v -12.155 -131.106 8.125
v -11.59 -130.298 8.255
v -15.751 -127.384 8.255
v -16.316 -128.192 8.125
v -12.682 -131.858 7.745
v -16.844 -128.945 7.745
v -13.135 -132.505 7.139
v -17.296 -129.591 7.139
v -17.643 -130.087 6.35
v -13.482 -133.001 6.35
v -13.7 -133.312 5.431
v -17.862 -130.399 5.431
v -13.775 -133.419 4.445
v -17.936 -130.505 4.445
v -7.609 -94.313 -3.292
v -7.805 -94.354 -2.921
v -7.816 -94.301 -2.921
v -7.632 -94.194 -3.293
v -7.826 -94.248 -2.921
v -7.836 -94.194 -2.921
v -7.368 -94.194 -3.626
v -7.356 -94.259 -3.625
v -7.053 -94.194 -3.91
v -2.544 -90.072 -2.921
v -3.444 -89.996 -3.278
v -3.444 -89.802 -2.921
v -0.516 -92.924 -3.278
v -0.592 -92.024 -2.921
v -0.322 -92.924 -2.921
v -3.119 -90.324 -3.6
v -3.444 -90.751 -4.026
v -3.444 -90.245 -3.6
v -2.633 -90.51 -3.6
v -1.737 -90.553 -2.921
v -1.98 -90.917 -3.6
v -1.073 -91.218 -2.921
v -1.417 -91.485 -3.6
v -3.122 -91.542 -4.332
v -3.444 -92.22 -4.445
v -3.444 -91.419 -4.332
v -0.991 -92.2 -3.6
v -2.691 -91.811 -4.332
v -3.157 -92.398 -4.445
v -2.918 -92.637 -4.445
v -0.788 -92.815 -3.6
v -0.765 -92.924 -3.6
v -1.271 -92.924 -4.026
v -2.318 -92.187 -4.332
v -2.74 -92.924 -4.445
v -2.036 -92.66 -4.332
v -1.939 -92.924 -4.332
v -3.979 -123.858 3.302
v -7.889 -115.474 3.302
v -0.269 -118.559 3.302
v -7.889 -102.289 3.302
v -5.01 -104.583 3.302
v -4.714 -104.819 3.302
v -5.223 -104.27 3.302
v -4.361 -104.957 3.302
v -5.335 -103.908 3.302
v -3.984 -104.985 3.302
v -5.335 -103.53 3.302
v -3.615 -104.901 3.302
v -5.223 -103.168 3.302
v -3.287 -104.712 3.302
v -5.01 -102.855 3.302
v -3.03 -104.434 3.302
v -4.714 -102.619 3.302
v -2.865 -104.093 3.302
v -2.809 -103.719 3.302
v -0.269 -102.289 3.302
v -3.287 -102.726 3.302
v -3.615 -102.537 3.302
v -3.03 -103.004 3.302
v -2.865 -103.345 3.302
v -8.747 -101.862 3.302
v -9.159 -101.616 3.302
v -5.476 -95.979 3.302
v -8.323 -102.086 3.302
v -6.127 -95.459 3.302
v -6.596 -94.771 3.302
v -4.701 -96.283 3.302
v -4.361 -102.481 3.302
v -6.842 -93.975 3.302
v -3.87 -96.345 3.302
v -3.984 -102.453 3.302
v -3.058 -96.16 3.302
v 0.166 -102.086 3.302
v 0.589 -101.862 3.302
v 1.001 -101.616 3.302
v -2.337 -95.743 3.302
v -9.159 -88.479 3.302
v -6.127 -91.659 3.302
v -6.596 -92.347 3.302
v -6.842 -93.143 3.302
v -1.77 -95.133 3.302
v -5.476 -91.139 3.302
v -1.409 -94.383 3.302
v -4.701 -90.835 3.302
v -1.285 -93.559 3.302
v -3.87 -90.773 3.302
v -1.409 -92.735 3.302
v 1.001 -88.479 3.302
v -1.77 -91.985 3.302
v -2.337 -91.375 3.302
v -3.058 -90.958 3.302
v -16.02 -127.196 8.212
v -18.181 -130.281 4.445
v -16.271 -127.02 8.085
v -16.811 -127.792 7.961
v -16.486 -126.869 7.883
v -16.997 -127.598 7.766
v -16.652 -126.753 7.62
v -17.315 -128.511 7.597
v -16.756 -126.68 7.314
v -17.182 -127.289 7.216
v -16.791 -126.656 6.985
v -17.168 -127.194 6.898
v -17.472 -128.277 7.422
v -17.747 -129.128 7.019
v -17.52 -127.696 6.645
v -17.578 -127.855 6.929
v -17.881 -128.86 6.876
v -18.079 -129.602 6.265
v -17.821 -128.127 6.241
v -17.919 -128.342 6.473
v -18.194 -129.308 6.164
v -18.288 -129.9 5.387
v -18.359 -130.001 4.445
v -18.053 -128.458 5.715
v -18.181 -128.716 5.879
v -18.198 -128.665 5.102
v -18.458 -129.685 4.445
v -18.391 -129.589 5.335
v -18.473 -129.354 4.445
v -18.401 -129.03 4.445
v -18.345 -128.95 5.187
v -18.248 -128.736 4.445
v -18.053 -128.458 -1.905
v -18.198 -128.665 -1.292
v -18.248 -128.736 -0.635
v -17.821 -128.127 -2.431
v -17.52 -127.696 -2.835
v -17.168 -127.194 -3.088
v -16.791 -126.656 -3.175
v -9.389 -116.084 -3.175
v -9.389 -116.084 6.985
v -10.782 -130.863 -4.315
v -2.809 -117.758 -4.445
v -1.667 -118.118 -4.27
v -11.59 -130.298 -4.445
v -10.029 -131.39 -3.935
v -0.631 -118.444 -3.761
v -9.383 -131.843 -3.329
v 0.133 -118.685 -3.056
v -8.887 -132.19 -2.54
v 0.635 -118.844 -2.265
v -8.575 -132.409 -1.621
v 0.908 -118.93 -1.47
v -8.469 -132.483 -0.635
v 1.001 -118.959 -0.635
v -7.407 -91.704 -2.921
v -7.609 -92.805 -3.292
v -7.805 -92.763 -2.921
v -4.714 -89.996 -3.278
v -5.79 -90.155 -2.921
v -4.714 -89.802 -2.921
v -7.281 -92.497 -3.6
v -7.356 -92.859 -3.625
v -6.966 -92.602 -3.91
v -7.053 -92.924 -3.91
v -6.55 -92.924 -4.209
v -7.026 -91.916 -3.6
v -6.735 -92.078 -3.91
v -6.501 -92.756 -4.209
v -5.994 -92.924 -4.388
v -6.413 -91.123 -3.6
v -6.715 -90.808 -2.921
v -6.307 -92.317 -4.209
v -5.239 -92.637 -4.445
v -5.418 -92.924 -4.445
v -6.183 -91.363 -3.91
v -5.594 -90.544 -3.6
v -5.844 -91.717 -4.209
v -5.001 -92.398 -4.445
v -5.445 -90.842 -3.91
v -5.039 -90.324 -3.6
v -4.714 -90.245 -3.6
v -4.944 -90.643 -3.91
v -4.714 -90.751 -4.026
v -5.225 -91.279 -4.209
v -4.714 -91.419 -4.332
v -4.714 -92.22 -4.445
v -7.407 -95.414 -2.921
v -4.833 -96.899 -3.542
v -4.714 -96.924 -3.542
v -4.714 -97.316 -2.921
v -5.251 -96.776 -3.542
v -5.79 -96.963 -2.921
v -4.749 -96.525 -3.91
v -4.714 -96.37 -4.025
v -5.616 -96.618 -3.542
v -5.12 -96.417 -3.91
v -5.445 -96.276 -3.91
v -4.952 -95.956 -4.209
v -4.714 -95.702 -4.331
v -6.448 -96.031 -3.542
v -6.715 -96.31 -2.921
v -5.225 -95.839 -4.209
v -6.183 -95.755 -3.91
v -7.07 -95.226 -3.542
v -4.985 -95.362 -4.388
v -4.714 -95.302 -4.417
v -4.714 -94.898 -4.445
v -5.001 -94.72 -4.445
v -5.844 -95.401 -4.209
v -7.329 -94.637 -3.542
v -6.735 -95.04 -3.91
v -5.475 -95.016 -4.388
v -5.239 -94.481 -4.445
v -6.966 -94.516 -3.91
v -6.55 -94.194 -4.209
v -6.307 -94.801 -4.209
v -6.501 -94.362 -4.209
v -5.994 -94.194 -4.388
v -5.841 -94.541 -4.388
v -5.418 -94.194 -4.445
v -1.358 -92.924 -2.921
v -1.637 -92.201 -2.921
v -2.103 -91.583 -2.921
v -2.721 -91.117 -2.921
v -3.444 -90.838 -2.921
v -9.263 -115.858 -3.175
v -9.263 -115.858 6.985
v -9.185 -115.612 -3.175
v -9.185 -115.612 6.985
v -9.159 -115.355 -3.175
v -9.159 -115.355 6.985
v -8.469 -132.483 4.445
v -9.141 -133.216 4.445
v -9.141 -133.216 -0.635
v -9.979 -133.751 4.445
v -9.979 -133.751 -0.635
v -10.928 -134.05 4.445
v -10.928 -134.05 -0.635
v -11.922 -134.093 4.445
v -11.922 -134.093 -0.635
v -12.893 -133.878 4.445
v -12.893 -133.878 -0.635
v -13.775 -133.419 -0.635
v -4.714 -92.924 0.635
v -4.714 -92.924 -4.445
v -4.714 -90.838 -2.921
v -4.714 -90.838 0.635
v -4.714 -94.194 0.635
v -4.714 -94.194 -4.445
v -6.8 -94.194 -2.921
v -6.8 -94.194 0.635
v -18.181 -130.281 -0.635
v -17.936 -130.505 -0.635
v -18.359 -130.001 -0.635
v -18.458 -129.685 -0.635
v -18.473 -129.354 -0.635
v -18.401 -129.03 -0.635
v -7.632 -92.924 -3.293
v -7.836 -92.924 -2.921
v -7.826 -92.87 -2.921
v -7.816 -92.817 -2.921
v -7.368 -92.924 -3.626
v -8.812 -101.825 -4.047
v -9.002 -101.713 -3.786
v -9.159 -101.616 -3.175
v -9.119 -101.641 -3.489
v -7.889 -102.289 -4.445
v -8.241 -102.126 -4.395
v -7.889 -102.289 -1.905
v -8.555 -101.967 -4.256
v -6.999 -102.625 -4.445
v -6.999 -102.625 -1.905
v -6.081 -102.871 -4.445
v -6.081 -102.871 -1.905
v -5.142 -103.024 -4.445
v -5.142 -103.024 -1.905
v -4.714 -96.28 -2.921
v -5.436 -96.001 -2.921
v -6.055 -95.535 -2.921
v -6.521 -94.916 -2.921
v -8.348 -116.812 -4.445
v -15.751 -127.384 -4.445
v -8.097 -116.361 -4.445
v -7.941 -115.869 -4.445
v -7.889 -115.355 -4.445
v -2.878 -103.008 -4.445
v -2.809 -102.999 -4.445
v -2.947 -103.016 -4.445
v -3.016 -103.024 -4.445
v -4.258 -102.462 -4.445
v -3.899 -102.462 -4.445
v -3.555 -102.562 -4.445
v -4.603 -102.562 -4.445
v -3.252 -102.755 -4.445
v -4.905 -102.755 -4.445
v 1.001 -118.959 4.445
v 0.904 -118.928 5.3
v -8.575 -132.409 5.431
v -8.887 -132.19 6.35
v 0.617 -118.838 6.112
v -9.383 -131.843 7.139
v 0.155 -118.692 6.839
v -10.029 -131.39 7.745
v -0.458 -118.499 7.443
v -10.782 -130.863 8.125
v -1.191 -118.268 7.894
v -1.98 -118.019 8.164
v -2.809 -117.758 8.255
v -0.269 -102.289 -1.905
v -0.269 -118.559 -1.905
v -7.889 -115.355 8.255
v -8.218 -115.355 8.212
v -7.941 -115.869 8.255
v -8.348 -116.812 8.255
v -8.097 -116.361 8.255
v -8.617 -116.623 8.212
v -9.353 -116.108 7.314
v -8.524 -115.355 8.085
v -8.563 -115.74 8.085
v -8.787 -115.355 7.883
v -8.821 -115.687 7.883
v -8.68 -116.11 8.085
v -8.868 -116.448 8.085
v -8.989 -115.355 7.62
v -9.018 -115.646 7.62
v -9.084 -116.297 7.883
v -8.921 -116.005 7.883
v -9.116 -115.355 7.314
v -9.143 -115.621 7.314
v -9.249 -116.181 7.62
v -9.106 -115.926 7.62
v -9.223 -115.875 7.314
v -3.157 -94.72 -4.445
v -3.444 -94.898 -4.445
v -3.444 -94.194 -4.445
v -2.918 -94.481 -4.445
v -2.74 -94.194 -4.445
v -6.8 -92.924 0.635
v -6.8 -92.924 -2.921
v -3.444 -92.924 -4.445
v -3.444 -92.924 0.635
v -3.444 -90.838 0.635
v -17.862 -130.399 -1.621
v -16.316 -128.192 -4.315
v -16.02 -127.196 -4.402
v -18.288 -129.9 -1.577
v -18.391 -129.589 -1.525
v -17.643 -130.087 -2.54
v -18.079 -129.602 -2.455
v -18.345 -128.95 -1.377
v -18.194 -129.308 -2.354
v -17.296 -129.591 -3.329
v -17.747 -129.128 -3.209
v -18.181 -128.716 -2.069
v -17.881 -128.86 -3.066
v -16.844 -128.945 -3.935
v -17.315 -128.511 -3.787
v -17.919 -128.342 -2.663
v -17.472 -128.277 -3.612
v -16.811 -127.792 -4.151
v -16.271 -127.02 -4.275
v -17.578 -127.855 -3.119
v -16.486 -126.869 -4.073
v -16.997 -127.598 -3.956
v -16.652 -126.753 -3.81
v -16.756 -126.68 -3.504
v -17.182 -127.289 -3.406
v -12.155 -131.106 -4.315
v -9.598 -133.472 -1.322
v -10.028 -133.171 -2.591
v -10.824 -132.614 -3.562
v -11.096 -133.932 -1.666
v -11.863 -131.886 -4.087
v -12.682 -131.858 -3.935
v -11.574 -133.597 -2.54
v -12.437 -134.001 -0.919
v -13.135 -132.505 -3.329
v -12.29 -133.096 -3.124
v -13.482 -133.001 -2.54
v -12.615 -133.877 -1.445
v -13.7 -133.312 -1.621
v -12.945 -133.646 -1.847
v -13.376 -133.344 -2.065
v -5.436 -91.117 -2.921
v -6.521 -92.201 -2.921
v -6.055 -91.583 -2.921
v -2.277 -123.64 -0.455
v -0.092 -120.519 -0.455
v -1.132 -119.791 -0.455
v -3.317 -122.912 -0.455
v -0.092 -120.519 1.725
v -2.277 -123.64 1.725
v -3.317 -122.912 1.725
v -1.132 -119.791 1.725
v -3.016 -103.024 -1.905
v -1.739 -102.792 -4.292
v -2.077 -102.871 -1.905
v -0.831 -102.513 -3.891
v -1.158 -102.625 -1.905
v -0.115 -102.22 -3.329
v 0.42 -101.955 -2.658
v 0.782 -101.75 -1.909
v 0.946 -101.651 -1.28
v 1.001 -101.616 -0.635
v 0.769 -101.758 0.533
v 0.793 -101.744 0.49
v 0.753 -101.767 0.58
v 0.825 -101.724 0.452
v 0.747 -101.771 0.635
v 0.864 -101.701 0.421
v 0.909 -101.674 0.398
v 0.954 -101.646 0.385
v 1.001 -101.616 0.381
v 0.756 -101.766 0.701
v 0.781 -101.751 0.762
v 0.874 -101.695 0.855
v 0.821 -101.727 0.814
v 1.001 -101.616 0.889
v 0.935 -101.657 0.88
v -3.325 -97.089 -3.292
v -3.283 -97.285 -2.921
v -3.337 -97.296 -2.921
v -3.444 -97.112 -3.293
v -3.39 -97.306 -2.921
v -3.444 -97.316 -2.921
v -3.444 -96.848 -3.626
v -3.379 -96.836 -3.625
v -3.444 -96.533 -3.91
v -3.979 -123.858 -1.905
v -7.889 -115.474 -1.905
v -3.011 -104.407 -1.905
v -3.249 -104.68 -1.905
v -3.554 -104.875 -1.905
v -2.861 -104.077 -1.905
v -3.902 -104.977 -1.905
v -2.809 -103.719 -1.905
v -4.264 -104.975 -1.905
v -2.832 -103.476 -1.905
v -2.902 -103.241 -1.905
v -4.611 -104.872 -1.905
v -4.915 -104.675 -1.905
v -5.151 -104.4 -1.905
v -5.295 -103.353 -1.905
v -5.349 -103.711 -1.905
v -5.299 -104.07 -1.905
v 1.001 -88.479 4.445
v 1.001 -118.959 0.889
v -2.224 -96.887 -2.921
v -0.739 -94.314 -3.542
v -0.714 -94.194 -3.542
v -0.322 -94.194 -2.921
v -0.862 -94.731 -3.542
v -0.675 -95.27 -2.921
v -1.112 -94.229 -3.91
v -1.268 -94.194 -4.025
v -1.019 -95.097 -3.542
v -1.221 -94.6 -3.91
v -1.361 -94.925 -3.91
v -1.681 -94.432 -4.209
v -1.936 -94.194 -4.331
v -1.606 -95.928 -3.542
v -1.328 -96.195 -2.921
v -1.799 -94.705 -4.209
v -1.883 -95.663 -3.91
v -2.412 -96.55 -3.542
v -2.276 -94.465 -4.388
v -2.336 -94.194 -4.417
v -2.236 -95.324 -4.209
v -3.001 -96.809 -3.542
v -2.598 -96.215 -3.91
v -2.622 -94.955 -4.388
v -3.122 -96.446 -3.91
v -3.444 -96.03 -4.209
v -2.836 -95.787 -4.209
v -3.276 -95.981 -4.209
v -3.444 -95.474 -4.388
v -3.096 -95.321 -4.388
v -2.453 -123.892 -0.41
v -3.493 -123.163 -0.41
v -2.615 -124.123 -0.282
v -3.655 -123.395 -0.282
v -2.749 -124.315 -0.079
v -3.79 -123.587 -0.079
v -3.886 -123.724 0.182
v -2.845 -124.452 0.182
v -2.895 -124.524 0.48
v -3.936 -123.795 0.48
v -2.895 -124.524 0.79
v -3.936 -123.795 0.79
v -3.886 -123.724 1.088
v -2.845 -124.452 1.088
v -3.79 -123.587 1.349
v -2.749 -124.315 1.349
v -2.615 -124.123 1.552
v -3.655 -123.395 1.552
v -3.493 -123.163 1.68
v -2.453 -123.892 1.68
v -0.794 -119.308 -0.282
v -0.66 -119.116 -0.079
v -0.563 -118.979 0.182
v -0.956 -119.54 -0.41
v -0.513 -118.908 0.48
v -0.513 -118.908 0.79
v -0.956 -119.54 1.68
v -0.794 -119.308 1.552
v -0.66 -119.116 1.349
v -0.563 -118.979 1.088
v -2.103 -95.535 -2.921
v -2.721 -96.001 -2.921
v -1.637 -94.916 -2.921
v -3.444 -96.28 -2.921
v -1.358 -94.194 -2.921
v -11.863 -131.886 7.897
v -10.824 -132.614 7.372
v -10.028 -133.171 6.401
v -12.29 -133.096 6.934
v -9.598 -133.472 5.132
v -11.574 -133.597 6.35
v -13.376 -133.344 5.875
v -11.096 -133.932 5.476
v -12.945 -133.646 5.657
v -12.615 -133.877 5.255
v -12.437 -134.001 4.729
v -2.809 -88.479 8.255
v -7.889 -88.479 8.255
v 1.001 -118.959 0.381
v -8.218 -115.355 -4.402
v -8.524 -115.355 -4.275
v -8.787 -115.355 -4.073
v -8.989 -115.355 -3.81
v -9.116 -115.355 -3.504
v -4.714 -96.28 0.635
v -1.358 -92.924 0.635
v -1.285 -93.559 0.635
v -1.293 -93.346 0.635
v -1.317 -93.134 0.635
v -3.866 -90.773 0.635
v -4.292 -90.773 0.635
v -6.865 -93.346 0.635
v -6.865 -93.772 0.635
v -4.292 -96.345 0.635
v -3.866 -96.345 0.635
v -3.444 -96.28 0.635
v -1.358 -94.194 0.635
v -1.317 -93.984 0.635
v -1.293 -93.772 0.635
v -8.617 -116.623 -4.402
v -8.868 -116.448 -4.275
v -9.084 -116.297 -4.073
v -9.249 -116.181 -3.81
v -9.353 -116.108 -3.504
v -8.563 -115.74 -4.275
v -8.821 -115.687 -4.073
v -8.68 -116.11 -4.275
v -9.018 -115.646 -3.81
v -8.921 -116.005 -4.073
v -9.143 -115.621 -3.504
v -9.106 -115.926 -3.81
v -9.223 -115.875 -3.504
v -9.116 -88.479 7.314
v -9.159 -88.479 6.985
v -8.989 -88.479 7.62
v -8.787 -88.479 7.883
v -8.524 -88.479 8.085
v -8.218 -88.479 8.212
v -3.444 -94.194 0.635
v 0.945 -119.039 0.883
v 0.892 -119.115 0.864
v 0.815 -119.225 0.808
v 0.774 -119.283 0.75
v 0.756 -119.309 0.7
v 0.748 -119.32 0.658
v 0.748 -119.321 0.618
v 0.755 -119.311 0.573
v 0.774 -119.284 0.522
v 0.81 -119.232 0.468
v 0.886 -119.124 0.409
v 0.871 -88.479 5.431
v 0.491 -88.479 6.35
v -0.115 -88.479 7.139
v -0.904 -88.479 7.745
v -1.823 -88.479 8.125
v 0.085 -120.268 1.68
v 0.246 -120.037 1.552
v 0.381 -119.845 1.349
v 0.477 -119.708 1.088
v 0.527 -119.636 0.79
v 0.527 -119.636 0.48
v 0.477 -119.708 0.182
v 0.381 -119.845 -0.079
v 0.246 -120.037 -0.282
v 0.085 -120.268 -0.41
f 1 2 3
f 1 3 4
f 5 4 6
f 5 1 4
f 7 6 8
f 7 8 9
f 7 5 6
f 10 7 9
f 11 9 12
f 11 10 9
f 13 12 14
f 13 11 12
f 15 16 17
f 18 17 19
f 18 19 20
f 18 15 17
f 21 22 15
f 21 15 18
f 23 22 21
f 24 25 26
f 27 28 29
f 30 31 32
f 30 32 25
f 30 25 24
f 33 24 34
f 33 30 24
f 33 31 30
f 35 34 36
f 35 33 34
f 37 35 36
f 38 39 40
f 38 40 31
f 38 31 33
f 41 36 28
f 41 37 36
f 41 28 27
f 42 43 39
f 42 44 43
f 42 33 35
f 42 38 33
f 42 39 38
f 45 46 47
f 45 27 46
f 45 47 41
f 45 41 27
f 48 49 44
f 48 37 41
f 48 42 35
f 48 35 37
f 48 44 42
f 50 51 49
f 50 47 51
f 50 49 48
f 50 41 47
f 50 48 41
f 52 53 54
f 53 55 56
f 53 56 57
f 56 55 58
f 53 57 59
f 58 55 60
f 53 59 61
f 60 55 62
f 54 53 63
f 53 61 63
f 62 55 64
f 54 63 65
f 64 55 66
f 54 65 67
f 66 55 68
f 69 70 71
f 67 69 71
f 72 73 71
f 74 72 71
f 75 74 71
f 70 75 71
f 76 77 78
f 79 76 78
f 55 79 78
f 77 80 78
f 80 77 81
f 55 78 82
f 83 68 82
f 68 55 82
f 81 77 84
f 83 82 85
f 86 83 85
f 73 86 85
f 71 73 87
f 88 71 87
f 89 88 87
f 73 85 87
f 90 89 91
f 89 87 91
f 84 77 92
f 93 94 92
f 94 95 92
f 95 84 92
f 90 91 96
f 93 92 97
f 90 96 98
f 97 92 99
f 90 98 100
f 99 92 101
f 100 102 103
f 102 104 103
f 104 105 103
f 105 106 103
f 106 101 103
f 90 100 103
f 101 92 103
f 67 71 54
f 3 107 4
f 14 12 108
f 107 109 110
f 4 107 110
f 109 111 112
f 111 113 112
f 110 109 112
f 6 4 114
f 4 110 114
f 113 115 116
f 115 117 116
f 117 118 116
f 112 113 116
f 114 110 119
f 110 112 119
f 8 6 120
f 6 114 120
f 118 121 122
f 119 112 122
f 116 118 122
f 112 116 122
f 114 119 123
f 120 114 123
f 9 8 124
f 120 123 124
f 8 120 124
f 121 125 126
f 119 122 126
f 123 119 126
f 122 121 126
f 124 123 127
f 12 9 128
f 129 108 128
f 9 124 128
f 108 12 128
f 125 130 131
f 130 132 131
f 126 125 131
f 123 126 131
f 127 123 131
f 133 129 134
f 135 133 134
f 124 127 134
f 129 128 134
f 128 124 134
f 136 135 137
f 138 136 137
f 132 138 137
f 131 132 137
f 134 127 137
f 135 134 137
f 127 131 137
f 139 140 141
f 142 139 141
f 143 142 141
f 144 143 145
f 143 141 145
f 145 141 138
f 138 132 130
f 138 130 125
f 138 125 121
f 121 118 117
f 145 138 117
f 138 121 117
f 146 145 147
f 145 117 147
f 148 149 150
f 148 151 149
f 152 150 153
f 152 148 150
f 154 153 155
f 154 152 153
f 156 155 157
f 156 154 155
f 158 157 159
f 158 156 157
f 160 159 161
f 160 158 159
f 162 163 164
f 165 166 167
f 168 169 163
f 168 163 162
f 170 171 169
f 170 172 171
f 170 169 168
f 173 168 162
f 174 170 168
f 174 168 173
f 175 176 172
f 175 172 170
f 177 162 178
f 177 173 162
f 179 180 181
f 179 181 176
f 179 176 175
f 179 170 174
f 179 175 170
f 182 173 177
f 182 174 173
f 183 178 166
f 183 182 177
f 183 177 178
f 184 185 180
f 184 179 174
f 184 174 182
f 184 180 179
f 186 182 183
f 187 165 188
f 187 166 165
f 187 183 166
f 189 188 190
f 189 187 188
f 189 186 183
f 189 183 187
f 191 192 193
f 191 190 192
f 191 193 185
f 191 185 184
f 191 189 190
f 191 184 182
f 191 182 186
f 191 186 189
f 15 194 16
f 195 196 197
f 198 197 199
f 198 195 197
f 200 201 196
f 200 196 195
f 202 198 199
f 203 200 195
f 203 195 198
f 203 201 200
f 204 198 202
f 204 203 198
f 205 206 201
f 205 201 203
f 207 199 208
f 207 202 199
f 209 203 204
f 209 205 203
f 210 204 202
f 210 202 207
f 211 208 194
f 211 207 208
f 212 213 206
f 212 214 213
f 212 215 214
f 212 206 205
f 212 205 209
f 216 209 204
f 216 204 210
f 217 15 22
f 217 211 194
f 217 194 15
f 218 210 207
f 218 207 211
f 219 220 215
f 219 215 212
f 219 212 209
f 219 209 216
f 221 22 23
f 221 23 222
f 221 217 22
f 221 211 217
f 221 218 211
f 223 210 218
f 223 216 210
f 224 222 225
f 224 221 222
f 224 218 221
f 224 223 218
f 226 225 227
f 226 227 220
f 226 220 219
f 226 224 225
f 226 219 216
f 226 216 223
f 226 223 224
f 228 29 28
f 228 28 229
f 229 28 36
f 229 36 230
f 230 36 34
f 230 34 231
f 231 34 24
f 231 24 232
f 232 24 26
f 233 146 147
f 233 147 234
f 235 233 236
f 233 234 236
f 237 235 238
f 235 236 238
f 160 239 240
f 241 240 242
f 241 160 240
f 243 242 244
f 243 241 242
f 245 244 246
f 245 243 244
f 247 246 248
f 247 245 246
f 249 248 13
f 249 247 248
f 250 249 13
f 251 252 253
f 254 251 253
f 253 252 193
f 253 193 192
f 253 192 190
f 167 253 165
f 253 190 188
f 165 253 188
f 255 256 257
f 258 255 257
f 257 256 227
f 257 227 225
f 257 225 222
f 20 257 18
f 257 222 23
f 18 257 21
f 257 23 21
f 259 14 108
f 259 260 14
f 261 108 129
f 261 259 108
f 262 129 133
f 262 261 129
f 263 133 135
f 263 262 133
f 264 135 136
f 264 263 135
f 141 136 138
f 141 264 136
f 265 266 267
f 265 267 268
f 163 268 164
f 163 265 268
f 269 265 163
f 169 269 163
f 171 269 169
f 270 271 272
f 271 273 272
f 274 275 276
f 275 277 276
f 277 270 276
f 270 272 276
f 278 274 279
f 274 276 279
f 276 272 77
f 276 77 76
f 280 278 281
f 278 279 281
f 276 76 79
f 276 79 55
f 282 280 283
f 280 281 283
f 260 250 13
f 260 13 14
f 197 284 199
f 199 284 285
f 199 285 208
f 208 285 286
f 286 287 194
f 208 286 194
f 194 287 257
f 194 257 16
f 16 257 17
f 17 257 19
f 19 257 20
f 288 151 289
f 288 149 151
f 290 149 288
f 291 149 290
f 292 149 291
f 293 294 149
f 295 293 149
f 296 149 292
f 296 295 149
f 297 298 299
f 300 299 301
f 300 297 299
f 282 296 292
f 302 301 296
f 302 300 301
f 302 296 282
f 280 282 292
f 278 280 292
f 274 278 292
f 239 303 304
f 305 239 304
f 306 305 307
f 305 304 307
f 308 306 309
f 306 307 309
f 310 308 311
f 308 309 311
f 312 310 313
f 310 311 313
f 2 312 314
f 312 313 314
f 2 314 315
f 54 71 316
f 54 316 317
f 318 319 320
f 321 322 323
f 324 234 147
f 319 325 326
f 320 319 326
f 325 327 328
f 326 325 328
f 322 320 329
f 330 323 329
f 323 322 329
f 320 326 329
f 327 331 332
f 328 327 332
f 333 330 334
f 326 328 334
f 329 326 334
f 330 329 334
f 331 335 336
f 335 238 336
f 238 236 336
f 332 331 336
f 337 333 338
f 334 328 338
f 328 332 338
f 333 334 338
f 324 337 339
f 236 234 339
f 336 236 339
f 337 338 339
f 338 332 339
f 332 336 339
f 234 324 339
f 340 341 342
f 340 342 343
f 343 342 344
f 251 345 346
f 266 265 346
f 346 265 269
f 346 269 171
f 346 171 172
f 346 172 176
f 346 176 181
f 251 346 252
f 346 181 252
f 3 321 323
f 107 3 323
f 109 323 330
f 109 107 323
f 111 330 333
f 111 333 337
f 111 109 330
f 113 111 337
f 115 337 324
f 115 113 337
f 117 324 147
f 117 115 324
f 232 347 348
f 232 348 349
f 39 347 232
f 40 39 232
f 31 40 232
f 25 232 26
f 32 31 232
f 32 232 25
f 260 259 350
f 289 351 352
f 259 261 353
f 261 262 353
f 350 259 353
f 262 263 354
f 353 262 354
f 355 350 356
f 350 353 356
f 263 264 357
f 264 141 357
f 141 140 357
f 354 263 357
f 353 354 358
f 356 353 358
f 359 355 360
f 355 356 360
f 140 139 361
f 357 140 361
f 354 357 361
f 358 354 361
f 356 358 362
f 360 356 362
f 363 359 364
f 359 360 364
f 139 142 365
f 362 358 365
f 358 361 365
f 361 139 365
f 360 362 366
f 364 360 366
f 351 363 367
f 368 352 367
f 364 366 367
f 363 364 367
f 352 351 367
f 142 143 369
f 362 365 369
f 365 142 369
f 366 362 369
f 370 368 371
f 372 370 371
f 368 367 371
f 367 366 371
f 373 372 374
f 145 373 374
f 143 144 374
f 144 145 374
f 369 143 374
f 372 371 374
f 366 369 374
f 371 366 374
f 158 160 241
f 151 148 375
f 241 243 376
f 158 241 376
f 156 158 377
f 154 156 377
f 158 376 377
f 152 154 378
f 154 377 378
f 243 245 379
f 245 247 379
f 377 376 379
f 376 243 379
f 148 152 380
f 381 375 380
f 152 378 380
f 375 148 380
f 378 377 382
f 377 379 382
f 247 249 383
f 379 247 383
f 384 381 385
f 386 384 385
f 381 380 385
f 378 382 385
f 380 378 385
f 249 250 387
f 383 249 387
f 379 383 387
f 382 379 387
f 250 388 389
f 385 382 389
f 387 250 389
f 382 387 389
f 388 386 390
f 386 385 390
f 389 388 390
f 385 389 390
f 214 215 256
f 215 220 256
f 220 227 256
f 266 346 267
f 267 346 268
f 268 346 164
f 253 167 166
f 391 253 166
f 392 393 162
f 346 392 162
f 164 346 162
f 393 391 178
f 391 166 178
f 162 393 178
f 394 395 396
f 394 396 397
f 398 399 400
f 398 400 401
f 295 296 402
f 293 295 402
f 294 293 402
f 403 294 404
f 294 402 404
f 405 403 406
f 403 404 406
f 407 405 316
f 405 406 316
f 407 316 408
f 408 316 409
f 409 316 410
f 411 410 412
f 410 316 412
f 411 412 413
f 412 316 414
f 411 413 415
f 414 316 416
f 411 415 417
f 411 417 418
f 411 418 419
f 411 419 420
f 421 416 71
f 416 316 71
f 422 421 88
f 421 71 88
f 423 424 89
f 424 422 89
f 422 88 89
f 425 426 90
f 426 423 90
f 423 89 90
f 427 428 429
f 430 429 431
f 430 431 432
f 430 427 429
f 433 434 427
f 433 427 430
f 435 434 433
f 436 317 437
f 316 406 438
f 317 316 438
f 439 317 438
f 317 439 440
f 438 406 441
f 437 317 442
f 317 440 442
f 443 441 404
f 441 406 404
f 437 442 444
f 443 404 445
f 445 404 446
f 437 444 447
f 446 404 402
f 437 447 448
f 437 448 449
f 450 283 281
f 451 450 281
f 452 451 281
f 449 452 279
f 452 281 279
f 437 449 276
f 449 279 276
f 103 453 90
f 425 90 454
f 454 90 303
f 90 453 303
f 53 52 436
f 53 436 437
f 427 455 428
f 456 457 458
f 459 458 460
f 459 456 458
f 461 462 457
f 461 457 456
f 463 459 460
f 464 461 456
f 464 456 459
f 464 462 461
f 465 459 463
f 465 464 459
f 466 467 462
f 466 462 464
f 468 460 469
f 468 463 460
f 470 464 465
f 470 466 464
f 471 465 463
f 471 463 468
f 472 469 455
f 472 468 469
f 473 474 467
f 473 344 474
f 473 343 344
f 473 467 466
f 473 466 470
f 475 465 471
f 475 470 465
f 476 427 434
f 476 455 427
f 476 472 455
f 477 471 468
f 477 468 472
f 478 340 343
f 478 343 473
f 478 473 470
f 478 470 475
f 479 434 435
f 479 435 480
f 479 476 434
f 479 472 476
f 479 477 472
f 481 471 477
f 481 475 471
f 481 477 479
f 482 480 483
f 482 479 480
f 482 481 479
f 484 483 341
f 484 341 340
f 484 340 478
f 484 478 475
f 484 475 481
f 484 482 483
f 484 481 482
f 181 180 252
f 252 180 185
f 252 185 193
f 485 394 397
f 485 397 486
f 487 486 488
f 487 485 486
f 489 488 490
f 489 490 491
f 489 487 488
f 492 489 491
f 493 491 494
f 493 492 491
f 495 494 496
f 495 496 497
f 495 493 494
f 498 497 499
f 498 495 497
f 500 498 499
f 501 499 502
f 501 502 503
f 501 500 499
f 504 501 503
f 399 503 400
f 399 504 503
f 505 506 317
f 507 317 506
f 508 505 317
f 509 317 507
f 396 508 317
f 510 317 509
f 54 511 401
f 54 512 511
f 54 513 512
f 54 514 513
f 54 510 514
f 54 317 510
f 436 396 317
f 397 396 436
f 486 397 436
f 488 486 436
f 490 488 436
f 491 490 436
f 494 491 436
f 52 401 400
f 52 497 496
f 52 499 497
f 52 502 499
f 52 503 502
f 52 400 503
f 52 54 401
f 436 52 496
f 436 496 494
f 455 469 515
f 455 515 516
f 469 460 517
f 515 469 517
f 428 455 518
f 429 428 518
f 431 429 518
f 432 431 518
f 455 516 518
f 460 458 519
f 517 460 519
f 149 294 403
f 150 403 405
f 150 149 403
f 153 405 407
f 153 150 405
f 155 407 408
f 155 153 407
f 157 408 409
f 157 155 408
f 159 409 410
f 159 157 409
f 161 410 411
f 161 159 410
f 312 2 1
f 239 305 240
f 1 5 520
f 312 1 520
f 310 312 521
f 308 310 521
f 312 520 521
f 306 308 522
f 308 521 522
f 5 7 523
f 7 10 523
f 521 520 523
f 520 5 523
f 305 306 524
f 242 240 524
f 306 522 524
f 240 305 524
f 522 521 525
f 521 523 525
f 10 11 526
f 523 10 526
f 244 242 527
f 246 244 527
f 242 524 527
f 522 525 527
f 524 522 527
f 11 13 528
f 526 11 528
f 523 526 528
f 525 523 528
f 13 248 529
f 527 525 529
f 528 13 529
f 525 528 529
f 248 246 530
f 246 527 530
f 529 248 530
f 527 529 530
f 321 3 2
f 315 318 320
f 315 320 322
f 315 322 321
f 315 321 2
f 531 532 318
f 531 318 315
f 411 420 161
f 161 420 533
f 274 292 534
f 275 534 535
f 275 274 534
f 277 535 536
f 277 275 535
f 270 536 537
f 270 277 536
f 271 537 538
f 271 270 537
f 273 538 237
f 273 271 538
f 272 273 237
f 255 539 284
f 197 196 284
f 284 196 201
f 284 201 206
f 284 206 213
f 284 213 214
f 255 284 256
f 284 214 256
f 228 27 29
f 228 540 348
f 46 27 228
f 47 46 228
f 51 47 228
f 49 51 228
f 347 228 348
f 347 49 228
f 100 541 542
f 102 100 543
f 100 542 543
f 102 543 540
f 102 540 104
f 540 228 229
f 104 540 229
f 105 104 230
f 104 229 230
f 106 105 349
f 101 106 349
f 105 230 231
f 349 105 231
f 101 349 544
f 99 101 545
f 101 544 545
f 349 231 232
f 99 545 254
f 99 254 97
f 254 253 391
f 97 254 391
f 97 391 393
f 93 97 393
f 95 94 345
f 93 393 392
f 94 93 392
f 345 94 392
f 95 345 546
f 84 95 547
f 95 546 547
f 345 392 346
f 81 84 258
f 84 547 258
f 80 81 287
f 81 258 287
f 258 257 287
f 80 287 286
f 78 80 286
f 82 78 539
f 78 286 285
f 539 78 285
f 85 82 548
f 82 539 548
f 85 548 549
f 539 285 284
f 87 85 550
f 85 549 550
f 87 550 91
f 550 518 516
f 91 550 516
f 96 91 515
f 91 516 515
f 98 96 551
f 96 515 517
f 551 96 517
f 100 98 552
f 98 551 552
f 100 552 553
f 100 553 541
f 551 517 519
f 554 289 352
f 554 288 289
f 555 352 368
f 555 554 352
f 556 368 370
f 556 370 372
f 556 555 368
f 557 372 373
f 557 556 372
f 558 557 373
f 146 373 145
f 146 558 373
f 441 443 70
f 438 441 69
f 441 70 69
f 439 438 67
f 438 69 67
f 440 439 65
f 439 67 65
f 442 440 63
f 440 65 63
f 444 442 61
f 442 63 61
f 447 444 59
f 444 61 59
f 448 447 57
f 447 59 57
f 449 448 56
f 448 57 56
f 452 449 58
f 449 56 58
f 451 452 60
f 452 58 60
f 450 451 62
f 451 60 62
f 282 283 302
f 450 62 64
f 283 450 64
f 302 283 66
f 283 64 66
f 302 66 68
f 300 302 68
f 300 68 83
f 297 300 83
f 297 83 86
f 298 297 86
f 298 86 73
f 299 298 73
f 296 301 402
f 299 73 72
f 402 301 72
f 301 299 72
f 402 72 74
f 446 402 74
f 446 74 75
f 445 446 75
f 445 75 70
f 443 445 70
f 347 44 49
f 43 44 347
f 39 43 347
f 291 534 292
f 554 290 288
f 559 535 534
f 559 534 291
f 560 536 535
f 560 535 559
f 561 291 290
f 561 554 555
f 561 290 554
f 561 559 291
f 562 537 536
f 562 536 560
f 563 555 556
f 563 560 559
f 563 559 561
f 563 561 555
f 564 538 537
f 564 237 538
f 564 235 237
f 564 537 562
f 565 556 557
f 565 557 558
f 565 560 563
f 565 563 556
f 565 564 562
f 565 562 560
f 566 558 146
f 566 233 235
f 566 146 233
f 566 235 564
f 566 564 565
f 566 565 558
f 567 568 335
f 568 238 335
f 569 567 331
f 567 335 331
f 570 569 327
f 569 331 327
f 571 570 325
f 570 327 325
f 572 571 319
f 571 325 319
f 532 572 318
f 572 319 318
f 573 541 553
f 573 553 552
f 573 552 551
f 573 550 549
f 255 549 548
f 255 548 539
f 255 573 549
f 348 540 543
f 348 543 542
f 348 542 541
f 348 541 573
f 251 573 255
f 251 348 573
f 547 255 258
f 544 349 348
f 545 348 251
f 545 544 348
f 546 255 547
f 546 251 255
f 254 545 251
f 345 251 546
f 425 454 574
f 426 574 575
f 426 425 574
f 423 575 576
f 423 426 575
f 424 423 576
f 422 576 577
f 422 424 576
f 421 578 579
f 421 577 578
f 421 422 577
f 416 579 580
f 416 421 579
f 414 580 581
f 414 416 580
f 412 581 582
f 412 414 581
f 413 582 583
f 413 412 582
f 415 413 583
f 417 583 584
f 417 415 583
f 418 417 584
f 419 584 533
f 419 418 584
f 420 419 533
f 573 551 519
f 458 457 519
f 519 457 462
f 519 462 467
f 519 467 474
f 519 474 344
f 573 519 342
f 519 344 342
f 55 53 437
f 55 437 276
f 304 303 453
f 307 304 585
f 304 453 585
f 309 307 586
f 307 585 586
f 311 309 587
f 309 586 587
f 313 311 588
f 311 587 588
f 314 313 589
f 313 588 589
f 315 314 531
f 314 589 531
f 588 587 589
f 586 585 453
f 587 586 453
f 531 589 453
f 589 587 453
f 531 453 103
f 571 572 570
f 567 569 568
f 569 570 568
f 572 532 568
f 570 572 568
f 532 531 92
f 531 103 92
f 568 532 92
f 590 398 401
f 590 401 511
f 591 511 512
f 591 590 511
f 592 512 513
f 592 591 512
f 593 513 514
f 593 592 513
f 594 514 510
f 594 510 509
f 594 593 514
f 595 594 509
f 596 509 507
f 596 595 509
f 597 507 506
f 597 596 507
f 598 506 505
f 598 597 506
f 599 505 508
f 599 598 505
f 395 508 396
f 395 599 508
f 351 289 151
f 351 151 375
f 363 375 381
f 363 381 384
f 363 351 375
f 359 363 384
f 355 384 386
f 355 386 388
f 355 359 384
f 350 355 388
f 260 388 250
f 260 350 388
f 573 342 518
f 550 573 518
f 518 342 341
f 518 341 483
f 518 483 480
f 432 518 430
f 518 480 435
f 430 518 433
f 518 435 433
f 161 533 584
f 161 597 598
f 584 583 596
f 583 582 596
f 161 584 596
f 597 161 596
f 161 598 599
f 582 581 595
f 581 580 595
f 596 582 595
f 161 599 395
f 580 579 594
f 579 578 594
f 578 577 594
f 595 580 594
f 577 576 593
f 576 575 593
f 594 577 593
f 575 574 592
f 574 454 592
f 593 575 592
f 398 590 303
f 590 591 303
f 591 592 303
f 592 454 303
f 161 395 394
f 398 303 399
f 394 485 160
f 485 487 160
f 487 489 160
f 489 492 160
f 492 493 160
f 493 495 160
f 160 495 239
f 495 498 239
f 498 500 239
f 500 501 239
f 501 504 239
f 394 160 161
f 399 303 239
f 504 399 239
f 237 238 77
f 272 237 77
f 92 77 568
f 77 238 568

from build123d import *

# Parameters (mm, degrees)
BOSS_EXTRUDE1_DEPTH      = 5.715
BOSS_EXTRUDE1_DEPTH_BACK = 4.445
SKETCH2_R                = 2.7940000000000054
SKETCH3_W                = 1.269999999999993
SKETCH3_H                = 1.2700000000000102
CUT_EXTRUDE1_DEPTH       = 5.08
BOSS_EXTRUDE2_DEPTH      = 1.524
FILLET1_R                = 2.54
BOSS_EXTRUDE3_DEPTH      = 2.54
BOSS_EXTRUDE3_DEPTH_BACK = 2.413
SKETCH5_R                = 2.7940000000000054
BOSS_EXTRUDE4_DEPTH      = 7.747
CUT_EXTRUDE2_START       = -1.397
CUT_EXTRUDE2_DEPTH       = 5.207
CUT_EXTRUDE5_DEPTH       = 1.27
BOSS_EXTRUDE5_REACH      = 139.144
SKETCH11_R               = 1.2700000000000067
CUT_EXTRUDE6_DEPTH       = 37.8413328747807
CUT_EXTRUDE6_DEPTH_BACK  = 37.8413328747807
SKETCH12_R               = 0.25399999999999967
FILLET2_R                = 3.8099999999999996
FILLET3_R                = 3.8099999999999996
FILLET4_R                = 1.27


with BuildPart() as part:
    # Sketch2 → Boss-Extrude1 (new, two sides: drawn at the far end of the back side and taken through both)
    with BuildSketch(Plane.XY.offset(-BOSS_EXTRUDE1_DEPTH_BACK)):
        with Locations((-4.07886393202022, -93.55895801032833)):
            Circle(SKETCH2_R)
    extrude(amount=BOSS_EXTRUDE1_DEPTH + BOSS_EXTRUDE1_DEPTH_BACK)

    # Sketch3 → Cut-Extrude1 (cut)
    with BuildSketch(Plane(origin=(0, 0, -4.445), x_dir=(-1, 0, 0), z_dir=(0, 0, -1))):
        with BuildLine():
            Line((3.443863932020214, -94.1939580103283), (3.443863932020214, -92.9239580103283))
            Line((3.4438639320202142, -92.9239580103283), (1.357979700745413, -92.9239580103283))
            ThreePointArc((1.3579797007454042, -92.92395801032826), (1.3032030609678973, -93.23936024921431), (1.2848639320202149, -93.55895801032833))
            ThreePointArc((1.2848639320202149, -93.55895801032833), (1.3032030609678946, -93.87855577144232), (1.3579797007453935, -94.19395801032834))
            Line((1.357979700745402, -94.1939580103283), (3.4438639320202142, -94.1939580103283))
        make_face()
        with Locations((4.0788639320202105, -93.5589580103283)):
            Rectangle(SKETCH3_W, SKETCH3_H)
        with BuildLine():
            ThreePointArc((4.713863932020238, -90.8380737790535), (4.398461693134176, -90.783297139276), (4.078863932020155, -90.76495801032831))
            ThreePointArc((4.078863932020155, -90.76495801032831), (3.7592661709062294, -90.783297139276), (3.4438639320202613, -90.83807377905349))
            Line((3.4438639320202147, -90.83807377905347), (3.443863932020214, -92.9239580103283))
            Line((3.4438639320202142, -92.9239580103283), (4.713863932020207, -92.9239580103283))
            Line((4.713863932020207, -92.9239580103283), (4.713863932020208, -90.8380737790535))
        make_face()
        with BuildLine():
            Line((6.7997481632950585, -92.9239580103283), (4.713863932020207, -92.9239580103283))
            Line((4.713863932020207, -92.9239580103283), (4.713863932020207, -94.1939580103283))
            Line((4.713863932020207, -94.1939580103283), (6.7997481632950665, -94.1939580103283))
            ThreePointArc((6.79974816329506, -94.19395801032829), (6.854524803072549, -93.87855577144228), (6.872863932020225, -93.55895801032833))
            ThreePointArc((6.872863932020225, -93.55895801032833), (6.854524803072548, -93.23936024921436), (6.799748163295054, -92.92395801032833))
        make_face()
        with BuildLine():
            Line((4.713863932020207, -94.1939580103283), (3.4438639320202142, -94.1939580103283))
            Line((3.443863932020214, -94.1939580103283), (3.443863932020213, -96.27984224160318))
            ThreePointArc((3.4438639320202564, -96.27984224160316), (3.759266170906339, -96.33461888138066), (4.078863932020378, -96.35295801032834))
            ThreePointArc((4.078863932020378, -96.35295801032834), (4.398461693134285, -96.33461888138064), (4.713863932020234, -96.27984224160315))
            Line((4.713863932020206, -96.27984224160315), (4.713863932020207, -94.1939580103283))
        make_face()
    extrude(amount=-CUT_EXTRUDE1_DEPTH, mode=Mode.SUBTRACT)

    # Sketch4 → Boss-Extrude2 (add)
    with BuildSketch(Plane(origin=(0, 0, -4.445), x_dir=(-1, 0, 0), z_dir=(0, 0, -1))):
        with BuildLine():
            Line((0.3221532697519658, -92.9239580103283), (1.3579797007453935, -92.9239580103283))
            ThreePointArc((1.3579797007453953, -92.9239580103283), (2.103207585385001, -91.58330166369309), (3.4438639320202142, -90.83807377905349))
            Line((3.4438639320202116, -90.83807377905349), (3.443863932020211, -89.80224734806006))
            ThreePointArc((3.443863932020212, -89.80224734806006), (1.3847870956994783, -90.86488117400758), (0.32215326975196623, -92.9239580103283))
        make_face()
        with BuildLine():
            Line((3.4438639320202147, -97.31566867259657), (3.4438639320202142, -96.27984224160315))
            ThreePointArc((3.4438639320202133, -96.27984224160315), (2.1032075853849914, -95.53461435696353), (1.357979700745386, -94.1939580103283))
            Line((1.357979700745385, -94.1939580103283), (0.32215326975196246, -94.1939580103283))
            ThreePointArc((0.3221532697519591, -94.1939580103283), (1.384787095699461, -96.25303484664906), (3.443863932020211, -97.31566867259659))
        make_face()
        with BuildLine():
            Line((4.713863932020205, -96.27984224160316), (4.713863932020205, -97.31566867259659))
            ThreePointArc((4.713863932020205, -97.31566867259659), (6.772940768340969, -96.25303484664907), (7.835574594288481, -94.1939580103283))
            Line((7.835574594288476, -94.1939580103283), (6.799748163295053, -94.1939580103283))
            ThreePointArc((6.7997481632950505, -94.1939580103283), (6.054520278655442, -95.53461435696354), (4.713863932020206, -96.27984224160316))
        make_face()
        with BuildLine():
            Line((4.713863932020206, -89.80224734806005), (4.713863932020206, -90.83807377905347))
            ThreePointArc((4.713863932020207, -90.83807377905347), (6.054520278655426, -91.58330166369309), (6.799748163295044, -92.9239580103283))
            Line((6.799748163295046, -92.9239580103283), (7.835574594288472, -92.9239580103283))
            ThreePointArc((7.835574594288474, -92.9239580103283), (6.772940768340954, -90.86488117400756), (4.713863932020203, -89.80224734806006))
        make_face()
    extrude(amount=-BOSS_EXTRUDE2_DEPTH)

    # Fillet1
    # the kernel refuses this fillet: 2.54 mm, written as the material it takes off along each edge
    with BuildSketch(Plane(origin=(-4.0788639320202495, -93.55895801032834, -4.445), x_dir=(-0.9779601169479317, 0.2087917854207577, 0), z_dir=(-0.2087917854207577, -0.9779601169479317, 0))) as fillet1_piece_1:
        with BuildLine():
            CenterArc((1.4820515469624638, -2.54), FILLET1_R, 23.578178478201842, 66.42182152179817)
            Line((1.4820515469624638, 0), (1.4820515469624638, 0.05079999999999973))
            Line((1.4820515469624638, 0.05079999999999973), (3.8100000000000294, 0.05079999999999973))
            Line((3.8100000000000294, 0.05079999999999973), (3.8608000000000278, 0))
            ThreePointArc((3.8608000000000278, 0), (3.860800000000029, -0.762), (3.8565589690607793, -1.5036800000000001))
            Line((3.8565589690607793, -1.5036800000000001), (3.81000000000003, -1.524))
        make_face()
    revolve(axis=Axis((-4.0788639320202495, -93.55895801032834, -4.445), (0, 0, -1)), revolution_arc=245.89688563167445, mode=Mode.SUBTRACT)
    with BuildSketch(Plane(origin=(-4.078863932020237, -93.55895801032833, -4.445), x_dir=(0.20879178542072774, 0.9779601169479382, 0), z_dir=(-0.9779601169479382, 0.20879178542072774, 0))) as fillet1_piece_2:
        with BuildLine():
            CenterArc((1.4820515469624473, -2.54), FILLET1_R, 23.578178478201917, 66.42182152179808)
            Line((1.4820515469624473, 0), (1.4820515469624473, 0.05079999999999973))
            Line((1.4820515469624473, 0.05079999999999973), (3.8100000000000094, 0.05079999999999973))
            Line((3.8100000000000094, 0.05079999999999973), (3.8608000000000127, 0))
            ThreePointArc((3.8608000000000127, 0), (3.8608000000000127, -0.7619999999999991), (3.8565589690607562, -1.5036799999999984))
            Line((3.8565589690607562, -1.5036799999999984), (3.810000000000009, -1.5239999999999982))
        make_face()
    revolve(axis=Axis((-4.078863932020237, -93.55895801032833, -4.445), (0, 0, -1)), revolution_arc=245.89688563167698, mode=Mode.SUBTRACT)
    with BuildSketch(Plane(origin=(-4.078863932020216, -93.55895801032833, -4.445), x_dir=(0.9779601169479387, -0.2087917854207255, 0), z_dir=(0.2087917854207255, 0.9779601169479387, 0))) as fillet1_piece_3:
        with BuildLine():
            CenterArc((1.482051546962437, -2.5400000000000005), FILLET1_R, 23.578178478201817, 66.42182152179818)
            Line((1.482051546962437, 0), (1.482051546962437, 0.05079999999999975))
            Line((1.482051546962437, 0.05079999999999975), (3.8100000000000045, 0.05079999999999975))
            Line((3.8100000000000045, 0.05079999999999975), (3.860800000000004, 0))
            ThreePointArc((3.860800000000004, 0), (3.860800000000005, -0.7620000000000007), (3.856558969060754, -1.503680000000001))
            Line((3.856558969060754, -1.503680000000001), (3.810000000000004, -1.524000000000001))
        make_face()
    revolve(axis=Axis((-4.078863932020216, -93.55895801032833, -4.445), (0, 0, -1)), revolution_arc=245.89688563167826, mode=Mode.SUBTRACT)
    with BuildSketch(Plane(origin=(-4.078863932020221, -93.55895801032833, -4.445), x_dir=(-0.20879178542073795, -0.9779601169479358, 0), z_dir=(0.9779601169479358, -0.20879178542073795, 0))) as fillet1_piece_4:
        with BuildLine():
            CenterArc((1.482051546962436, -2.5399999999999996), FILLET1_R, 23.57817847820183, 66.42182152179817)
            Line((1.482051546962436, 0), (1.482051546962436, 0.05079999999999972))
            Line((1.482051546962436, 0.05079999999999972), (3.8100000000000027, 0.05079999999999972))
            Line((3.8100000000000027, 0.05079999999999972), (3.8608000000000064, 0))
            ThreePointArc((3.8608000000000064, 0), (3.8608000000000064, -0.7619999999999998), (3.85655896906075, -1.5036799999999997))
            Line((3.85655896906075, -1.5036799999999997), (3.8100000000000027, -1.5239999999999996))
        make_face()
    revolve(axis=Axis((-4.078863932020221, -93.55895801032833, -4.445), (0, 0, -1)), revolution_arc=245.8968856316771, mode=Mode.SUBTRACT)

    # Sketch5 → Boss-Extrude3 (add, two sides: drawn at the far end of the back side and taken through both)
    # profile 1 of 4: a face of its own
    with BuildSketch(Plane.XY.offset(5.714999999999999).offset(-BOSS_EXTRUDE3_DEPTH_BACK)):
        Polygon((-7.321448701996411, -113.13142141700175), (1.001136067979783, -118.95895801032833), (1.0011360679797812, -88.47895801032831), (-9.158863932020221, -88.47895801032831), (-9.158863932020218, -115.75552231531789), align=None)
        with Locations((-4.07886393202022, -93.55895801032833)):
            Circle(SKETCH5_R, mode=Mode.SUBTRACT)
    # profile 2 of 4: a face of its own
    with BuildSketch(Plane.XY.offset(5.714999999999999).offset(-BOSS_EXTRUDE3_DEPTH_BACK)):
        Polygon((-9.158863932020218, -118.95895801032833), (1.0011360679797825, -118.95895801032833), (-7.321448701996411, -113.13142141700175), (-9.15886393202022, -115.75552231531789), align=None)
    # profile 3 of 4: a face of its own
    with BuildSketch(Plane.XY.offset(5.714999999999999).offset(-BOSS_EXTRUDE3_DEPTH_BACK)):
        Polygon((-18.97652188864955, -129.77659095695412), (-10.653937118673376, -135.6041275502807), (1.0011360679797825, -118.95895801032833), (-9.158863932020218, -118.95895801032833), (-9.158863932020218, -115.75552231531789), align=None)
    # profile 4 of 4: a face of its own
    with BuildSketch(Plane.XY.offset(5.714999999999999).offset(-BOSS_EXTRUDE3_DEPTH_BACK)):
        with Locations((-4.07886393202022, -93.55895801032833)):
            Circle(SKETCH5_R)
    extrude(amount=BOSS_EXTRUDE3_DEPTH + BOSS_EXTRUDE3_DEPTH_BACK)

    # Sketch6 → Boss-Extrude4 (add)
    with BuildSketch(Plane(origin=(0, 0, 3.3019999999999996), x_dir=(-1, 0, 0), z_dir=(0, 0, -1))):
        with BuildLine():
            ThreePointArc((9.158863932020274, -101.61620474851374), (4.078863932020362, -103.08395801032833), (-1.0011360679795924, -101.6162047485139))
            Line((-1.0011360679797843, -101.61620474851397), (-1.0011360679797883, -118.95895801032833))
            Line((-1.0011360679797883, -118.95895801032833), (10.653937118673378, -135.60412755028074))
            Line((10.65393711867338, -135.60412755028074), (18.976521888649547, -129.77659095695415))
            Line((18.976521888649547, -129.77659095695415), (9.158863932020218, -115.75552231531788))
            Line((9.158863932020218, -115.75552231531788), (9.15886393202022, -101.61620474851372))
        make_face()
    extrude(amount=BOSS_EXTRUDE4_DEPTH)

    # Sketch9 → Cut-Extrude2 (cut)
    with BuildSketch(Plane(origin=(0, 0, 1.9049999999999978), x_dir=(-1, 0, 0), z_dir=(0, 0, -1)).offset(CUT_EXTRUDE2_START)):
        with BuildLine():
            ThreePointArc((7.8888639320202145, -102.2887647092192), (4.078863932020218, -103.08395801032832), (0.26886393202022063, -102.2887647092192))
            Line((0.2688639320202225, -102.2887647092192), (0.26886393202022446, -118.55852854845203))
            Line((0.2688639320202246, -118.55852854845203), (3.9794333963345054, -123.8577709327907))
            Line((3.9794333963345054, -123.8577709327907), (7.888863932020215, -115.47397009376135))
            Line((7.888863932020215, -115.47397009376135), (7.888863932020214, -102.2887647092192))
        make_face()
    extrude(amount=CUT_EXTRUDE2_DEPTH, mode=Mode.SUBTRACT)

    # Sketch10 → Cut-Extrude5 (cut)
    with BuildSketch(Plane(origin=(56.56419989406226, -39.606679158622775, 0), x_dir=(0, 0, -1), z_dir=(0.8191520442889951, -0.5735764363510415, 0))):
        with BuildLine():
            Line((0.45463666916395357, -98.77624558247483), (0.45463666916395473, -102.58624558247485))
            ThreePointArc((0.45463666916395473, -102.58624558247485), (-0.6349999999999958, -103.6758822516388), (-1.7246366691639448, -102.58624558247485))
            Line((-1.7246366691639448, -102.58624558247485), (-1.7246366691639459, -98.77624558247483))
            ThreePointArc((-1.7246366691639459, -98.77624558247483), (-0.6349999999999967, -97.68660891331088), (0.45463666916395357, -98.77624558247483))
        make_face()
    extrude(amount=-CUT_EXTRUDE5_DEPTH, mode=Mode.SUBTRACT)

    # Boss-Extrude5: up to this face of the body (flat: up to its plane)
    boss_extrude5_end = Plane(part.part.faces().sort_by_distance((-6.926760918, -118.442460809, -4.445))[0])
    # Sketch11 → Boss-Extrude5 (add, up to the picked face)
    with BuildSketch(Plane(origin=(0, 0, 3.3019999999999996), x_dir=(-1, 0, 0), z_dir=(0, 0, -1)), mode=Mode.PRIVATE) as boss_extrude5_sk1:
        with Locations(Location((4.07886393202022, -103.71895801032832, 0), (0, 0, 180))):
            Circle(SKETCH11_R)
    boss_extrude5_tool1 = split(extrude(boss_extrude5_sk1.sketch, amount=BOSS_EXTRUDE5_REACH, mode=Mode.PRIVATE), bisect_by=boss_extrude5_end, keep=Keep.BOTH, mode=Mode.PRIVATE)
    add(boss_extrude5_tool1.solids().sort_by(Axis((-4.078864, -103.718958, 3.302), (0, 0, -1)))[0])

    # Sketch12 → Cut-Extrude6 (cut, two sides: drawn at the far end of the back side and taken through both)
    with BuildSketch(Plane(origin=(6.77e-15, -118.95895801032833, 0), x_dir=(1.64e-15, 0, -1), z_dir=(6e-17, -1, 0)).offset(-CUT_EXTRUDE6_DEPTH_BACK)):
        with Locations((-0.6349999999999941, 1.0011360679797785)):
            Circle(SKETCH12_R)
    extrude(amount=CUT_EXTRUDE6_DEPTH + CUT_EXTRUDE6_DEPTH_BACK, mode=Mode.SUBTRACT)

    # Fillet2
    fillet2_edges = [part.edges().sort_by_distance(p)[0] for p in [
        (1.001136067979782, -103.71895801032832, 8.254999999999999),
        (-4.826400525346797, -127.28154278030452, 8.254999999999999),
        (-4.826400525346795, -127.28154278030453, -4.445),
        (1.0011360679797863, -110.28758137942114, -4.445),
    ]]
    fillet(fillet2_edges, radius=FILLET2_R)

    # Fillet3
    fillet3_edges = [part.edges().sort_by_distance(p)[0] for p in [
        (-16.375714148031996, -131.5976961423687, -4.445),
        (-10.653937118673378, -135.60412755028074, 1.9049999999999985),
        (-16.375714148032003, -131.59769614236868, 8.254999999999999),
        (-11.568047859470695, -134.964060318816, 7.139076836320746),
        (-11.568047859470676, -134.964060318816, -3.3290768363207524),
    ]]
    fillet(fillet3_edges, radius=FILLET3_R)

    # Fillet4
    fillet4_edges = [part.edges().sort_by_distance(p)[0] for p in [
        (-9.158863932020218, -115.75552231531788, 1.9049999999999994),
        (-9.15886393202022, -102.1172401628231, 8.254999999999999),
        (-9.158863932020218, -108.6858635319158, -4.445),
        (-12.975029799086151, -121.20557199176548, -4.445),
        (-12.975029799086162, -121.20557199176548, 8.254999999999999),
        (-18.976521888649547, -129.77659095695415, 1.9049999999999994),
        (-18.336454657184845, -128.86248021615683, -3.329076836320745),
        (-18.33645465718485, -128.86248021615685, 7.139076836320745),
    ]]
    fillet(fillet4_edges, radius=FILLET4_R)


solid = part.part
